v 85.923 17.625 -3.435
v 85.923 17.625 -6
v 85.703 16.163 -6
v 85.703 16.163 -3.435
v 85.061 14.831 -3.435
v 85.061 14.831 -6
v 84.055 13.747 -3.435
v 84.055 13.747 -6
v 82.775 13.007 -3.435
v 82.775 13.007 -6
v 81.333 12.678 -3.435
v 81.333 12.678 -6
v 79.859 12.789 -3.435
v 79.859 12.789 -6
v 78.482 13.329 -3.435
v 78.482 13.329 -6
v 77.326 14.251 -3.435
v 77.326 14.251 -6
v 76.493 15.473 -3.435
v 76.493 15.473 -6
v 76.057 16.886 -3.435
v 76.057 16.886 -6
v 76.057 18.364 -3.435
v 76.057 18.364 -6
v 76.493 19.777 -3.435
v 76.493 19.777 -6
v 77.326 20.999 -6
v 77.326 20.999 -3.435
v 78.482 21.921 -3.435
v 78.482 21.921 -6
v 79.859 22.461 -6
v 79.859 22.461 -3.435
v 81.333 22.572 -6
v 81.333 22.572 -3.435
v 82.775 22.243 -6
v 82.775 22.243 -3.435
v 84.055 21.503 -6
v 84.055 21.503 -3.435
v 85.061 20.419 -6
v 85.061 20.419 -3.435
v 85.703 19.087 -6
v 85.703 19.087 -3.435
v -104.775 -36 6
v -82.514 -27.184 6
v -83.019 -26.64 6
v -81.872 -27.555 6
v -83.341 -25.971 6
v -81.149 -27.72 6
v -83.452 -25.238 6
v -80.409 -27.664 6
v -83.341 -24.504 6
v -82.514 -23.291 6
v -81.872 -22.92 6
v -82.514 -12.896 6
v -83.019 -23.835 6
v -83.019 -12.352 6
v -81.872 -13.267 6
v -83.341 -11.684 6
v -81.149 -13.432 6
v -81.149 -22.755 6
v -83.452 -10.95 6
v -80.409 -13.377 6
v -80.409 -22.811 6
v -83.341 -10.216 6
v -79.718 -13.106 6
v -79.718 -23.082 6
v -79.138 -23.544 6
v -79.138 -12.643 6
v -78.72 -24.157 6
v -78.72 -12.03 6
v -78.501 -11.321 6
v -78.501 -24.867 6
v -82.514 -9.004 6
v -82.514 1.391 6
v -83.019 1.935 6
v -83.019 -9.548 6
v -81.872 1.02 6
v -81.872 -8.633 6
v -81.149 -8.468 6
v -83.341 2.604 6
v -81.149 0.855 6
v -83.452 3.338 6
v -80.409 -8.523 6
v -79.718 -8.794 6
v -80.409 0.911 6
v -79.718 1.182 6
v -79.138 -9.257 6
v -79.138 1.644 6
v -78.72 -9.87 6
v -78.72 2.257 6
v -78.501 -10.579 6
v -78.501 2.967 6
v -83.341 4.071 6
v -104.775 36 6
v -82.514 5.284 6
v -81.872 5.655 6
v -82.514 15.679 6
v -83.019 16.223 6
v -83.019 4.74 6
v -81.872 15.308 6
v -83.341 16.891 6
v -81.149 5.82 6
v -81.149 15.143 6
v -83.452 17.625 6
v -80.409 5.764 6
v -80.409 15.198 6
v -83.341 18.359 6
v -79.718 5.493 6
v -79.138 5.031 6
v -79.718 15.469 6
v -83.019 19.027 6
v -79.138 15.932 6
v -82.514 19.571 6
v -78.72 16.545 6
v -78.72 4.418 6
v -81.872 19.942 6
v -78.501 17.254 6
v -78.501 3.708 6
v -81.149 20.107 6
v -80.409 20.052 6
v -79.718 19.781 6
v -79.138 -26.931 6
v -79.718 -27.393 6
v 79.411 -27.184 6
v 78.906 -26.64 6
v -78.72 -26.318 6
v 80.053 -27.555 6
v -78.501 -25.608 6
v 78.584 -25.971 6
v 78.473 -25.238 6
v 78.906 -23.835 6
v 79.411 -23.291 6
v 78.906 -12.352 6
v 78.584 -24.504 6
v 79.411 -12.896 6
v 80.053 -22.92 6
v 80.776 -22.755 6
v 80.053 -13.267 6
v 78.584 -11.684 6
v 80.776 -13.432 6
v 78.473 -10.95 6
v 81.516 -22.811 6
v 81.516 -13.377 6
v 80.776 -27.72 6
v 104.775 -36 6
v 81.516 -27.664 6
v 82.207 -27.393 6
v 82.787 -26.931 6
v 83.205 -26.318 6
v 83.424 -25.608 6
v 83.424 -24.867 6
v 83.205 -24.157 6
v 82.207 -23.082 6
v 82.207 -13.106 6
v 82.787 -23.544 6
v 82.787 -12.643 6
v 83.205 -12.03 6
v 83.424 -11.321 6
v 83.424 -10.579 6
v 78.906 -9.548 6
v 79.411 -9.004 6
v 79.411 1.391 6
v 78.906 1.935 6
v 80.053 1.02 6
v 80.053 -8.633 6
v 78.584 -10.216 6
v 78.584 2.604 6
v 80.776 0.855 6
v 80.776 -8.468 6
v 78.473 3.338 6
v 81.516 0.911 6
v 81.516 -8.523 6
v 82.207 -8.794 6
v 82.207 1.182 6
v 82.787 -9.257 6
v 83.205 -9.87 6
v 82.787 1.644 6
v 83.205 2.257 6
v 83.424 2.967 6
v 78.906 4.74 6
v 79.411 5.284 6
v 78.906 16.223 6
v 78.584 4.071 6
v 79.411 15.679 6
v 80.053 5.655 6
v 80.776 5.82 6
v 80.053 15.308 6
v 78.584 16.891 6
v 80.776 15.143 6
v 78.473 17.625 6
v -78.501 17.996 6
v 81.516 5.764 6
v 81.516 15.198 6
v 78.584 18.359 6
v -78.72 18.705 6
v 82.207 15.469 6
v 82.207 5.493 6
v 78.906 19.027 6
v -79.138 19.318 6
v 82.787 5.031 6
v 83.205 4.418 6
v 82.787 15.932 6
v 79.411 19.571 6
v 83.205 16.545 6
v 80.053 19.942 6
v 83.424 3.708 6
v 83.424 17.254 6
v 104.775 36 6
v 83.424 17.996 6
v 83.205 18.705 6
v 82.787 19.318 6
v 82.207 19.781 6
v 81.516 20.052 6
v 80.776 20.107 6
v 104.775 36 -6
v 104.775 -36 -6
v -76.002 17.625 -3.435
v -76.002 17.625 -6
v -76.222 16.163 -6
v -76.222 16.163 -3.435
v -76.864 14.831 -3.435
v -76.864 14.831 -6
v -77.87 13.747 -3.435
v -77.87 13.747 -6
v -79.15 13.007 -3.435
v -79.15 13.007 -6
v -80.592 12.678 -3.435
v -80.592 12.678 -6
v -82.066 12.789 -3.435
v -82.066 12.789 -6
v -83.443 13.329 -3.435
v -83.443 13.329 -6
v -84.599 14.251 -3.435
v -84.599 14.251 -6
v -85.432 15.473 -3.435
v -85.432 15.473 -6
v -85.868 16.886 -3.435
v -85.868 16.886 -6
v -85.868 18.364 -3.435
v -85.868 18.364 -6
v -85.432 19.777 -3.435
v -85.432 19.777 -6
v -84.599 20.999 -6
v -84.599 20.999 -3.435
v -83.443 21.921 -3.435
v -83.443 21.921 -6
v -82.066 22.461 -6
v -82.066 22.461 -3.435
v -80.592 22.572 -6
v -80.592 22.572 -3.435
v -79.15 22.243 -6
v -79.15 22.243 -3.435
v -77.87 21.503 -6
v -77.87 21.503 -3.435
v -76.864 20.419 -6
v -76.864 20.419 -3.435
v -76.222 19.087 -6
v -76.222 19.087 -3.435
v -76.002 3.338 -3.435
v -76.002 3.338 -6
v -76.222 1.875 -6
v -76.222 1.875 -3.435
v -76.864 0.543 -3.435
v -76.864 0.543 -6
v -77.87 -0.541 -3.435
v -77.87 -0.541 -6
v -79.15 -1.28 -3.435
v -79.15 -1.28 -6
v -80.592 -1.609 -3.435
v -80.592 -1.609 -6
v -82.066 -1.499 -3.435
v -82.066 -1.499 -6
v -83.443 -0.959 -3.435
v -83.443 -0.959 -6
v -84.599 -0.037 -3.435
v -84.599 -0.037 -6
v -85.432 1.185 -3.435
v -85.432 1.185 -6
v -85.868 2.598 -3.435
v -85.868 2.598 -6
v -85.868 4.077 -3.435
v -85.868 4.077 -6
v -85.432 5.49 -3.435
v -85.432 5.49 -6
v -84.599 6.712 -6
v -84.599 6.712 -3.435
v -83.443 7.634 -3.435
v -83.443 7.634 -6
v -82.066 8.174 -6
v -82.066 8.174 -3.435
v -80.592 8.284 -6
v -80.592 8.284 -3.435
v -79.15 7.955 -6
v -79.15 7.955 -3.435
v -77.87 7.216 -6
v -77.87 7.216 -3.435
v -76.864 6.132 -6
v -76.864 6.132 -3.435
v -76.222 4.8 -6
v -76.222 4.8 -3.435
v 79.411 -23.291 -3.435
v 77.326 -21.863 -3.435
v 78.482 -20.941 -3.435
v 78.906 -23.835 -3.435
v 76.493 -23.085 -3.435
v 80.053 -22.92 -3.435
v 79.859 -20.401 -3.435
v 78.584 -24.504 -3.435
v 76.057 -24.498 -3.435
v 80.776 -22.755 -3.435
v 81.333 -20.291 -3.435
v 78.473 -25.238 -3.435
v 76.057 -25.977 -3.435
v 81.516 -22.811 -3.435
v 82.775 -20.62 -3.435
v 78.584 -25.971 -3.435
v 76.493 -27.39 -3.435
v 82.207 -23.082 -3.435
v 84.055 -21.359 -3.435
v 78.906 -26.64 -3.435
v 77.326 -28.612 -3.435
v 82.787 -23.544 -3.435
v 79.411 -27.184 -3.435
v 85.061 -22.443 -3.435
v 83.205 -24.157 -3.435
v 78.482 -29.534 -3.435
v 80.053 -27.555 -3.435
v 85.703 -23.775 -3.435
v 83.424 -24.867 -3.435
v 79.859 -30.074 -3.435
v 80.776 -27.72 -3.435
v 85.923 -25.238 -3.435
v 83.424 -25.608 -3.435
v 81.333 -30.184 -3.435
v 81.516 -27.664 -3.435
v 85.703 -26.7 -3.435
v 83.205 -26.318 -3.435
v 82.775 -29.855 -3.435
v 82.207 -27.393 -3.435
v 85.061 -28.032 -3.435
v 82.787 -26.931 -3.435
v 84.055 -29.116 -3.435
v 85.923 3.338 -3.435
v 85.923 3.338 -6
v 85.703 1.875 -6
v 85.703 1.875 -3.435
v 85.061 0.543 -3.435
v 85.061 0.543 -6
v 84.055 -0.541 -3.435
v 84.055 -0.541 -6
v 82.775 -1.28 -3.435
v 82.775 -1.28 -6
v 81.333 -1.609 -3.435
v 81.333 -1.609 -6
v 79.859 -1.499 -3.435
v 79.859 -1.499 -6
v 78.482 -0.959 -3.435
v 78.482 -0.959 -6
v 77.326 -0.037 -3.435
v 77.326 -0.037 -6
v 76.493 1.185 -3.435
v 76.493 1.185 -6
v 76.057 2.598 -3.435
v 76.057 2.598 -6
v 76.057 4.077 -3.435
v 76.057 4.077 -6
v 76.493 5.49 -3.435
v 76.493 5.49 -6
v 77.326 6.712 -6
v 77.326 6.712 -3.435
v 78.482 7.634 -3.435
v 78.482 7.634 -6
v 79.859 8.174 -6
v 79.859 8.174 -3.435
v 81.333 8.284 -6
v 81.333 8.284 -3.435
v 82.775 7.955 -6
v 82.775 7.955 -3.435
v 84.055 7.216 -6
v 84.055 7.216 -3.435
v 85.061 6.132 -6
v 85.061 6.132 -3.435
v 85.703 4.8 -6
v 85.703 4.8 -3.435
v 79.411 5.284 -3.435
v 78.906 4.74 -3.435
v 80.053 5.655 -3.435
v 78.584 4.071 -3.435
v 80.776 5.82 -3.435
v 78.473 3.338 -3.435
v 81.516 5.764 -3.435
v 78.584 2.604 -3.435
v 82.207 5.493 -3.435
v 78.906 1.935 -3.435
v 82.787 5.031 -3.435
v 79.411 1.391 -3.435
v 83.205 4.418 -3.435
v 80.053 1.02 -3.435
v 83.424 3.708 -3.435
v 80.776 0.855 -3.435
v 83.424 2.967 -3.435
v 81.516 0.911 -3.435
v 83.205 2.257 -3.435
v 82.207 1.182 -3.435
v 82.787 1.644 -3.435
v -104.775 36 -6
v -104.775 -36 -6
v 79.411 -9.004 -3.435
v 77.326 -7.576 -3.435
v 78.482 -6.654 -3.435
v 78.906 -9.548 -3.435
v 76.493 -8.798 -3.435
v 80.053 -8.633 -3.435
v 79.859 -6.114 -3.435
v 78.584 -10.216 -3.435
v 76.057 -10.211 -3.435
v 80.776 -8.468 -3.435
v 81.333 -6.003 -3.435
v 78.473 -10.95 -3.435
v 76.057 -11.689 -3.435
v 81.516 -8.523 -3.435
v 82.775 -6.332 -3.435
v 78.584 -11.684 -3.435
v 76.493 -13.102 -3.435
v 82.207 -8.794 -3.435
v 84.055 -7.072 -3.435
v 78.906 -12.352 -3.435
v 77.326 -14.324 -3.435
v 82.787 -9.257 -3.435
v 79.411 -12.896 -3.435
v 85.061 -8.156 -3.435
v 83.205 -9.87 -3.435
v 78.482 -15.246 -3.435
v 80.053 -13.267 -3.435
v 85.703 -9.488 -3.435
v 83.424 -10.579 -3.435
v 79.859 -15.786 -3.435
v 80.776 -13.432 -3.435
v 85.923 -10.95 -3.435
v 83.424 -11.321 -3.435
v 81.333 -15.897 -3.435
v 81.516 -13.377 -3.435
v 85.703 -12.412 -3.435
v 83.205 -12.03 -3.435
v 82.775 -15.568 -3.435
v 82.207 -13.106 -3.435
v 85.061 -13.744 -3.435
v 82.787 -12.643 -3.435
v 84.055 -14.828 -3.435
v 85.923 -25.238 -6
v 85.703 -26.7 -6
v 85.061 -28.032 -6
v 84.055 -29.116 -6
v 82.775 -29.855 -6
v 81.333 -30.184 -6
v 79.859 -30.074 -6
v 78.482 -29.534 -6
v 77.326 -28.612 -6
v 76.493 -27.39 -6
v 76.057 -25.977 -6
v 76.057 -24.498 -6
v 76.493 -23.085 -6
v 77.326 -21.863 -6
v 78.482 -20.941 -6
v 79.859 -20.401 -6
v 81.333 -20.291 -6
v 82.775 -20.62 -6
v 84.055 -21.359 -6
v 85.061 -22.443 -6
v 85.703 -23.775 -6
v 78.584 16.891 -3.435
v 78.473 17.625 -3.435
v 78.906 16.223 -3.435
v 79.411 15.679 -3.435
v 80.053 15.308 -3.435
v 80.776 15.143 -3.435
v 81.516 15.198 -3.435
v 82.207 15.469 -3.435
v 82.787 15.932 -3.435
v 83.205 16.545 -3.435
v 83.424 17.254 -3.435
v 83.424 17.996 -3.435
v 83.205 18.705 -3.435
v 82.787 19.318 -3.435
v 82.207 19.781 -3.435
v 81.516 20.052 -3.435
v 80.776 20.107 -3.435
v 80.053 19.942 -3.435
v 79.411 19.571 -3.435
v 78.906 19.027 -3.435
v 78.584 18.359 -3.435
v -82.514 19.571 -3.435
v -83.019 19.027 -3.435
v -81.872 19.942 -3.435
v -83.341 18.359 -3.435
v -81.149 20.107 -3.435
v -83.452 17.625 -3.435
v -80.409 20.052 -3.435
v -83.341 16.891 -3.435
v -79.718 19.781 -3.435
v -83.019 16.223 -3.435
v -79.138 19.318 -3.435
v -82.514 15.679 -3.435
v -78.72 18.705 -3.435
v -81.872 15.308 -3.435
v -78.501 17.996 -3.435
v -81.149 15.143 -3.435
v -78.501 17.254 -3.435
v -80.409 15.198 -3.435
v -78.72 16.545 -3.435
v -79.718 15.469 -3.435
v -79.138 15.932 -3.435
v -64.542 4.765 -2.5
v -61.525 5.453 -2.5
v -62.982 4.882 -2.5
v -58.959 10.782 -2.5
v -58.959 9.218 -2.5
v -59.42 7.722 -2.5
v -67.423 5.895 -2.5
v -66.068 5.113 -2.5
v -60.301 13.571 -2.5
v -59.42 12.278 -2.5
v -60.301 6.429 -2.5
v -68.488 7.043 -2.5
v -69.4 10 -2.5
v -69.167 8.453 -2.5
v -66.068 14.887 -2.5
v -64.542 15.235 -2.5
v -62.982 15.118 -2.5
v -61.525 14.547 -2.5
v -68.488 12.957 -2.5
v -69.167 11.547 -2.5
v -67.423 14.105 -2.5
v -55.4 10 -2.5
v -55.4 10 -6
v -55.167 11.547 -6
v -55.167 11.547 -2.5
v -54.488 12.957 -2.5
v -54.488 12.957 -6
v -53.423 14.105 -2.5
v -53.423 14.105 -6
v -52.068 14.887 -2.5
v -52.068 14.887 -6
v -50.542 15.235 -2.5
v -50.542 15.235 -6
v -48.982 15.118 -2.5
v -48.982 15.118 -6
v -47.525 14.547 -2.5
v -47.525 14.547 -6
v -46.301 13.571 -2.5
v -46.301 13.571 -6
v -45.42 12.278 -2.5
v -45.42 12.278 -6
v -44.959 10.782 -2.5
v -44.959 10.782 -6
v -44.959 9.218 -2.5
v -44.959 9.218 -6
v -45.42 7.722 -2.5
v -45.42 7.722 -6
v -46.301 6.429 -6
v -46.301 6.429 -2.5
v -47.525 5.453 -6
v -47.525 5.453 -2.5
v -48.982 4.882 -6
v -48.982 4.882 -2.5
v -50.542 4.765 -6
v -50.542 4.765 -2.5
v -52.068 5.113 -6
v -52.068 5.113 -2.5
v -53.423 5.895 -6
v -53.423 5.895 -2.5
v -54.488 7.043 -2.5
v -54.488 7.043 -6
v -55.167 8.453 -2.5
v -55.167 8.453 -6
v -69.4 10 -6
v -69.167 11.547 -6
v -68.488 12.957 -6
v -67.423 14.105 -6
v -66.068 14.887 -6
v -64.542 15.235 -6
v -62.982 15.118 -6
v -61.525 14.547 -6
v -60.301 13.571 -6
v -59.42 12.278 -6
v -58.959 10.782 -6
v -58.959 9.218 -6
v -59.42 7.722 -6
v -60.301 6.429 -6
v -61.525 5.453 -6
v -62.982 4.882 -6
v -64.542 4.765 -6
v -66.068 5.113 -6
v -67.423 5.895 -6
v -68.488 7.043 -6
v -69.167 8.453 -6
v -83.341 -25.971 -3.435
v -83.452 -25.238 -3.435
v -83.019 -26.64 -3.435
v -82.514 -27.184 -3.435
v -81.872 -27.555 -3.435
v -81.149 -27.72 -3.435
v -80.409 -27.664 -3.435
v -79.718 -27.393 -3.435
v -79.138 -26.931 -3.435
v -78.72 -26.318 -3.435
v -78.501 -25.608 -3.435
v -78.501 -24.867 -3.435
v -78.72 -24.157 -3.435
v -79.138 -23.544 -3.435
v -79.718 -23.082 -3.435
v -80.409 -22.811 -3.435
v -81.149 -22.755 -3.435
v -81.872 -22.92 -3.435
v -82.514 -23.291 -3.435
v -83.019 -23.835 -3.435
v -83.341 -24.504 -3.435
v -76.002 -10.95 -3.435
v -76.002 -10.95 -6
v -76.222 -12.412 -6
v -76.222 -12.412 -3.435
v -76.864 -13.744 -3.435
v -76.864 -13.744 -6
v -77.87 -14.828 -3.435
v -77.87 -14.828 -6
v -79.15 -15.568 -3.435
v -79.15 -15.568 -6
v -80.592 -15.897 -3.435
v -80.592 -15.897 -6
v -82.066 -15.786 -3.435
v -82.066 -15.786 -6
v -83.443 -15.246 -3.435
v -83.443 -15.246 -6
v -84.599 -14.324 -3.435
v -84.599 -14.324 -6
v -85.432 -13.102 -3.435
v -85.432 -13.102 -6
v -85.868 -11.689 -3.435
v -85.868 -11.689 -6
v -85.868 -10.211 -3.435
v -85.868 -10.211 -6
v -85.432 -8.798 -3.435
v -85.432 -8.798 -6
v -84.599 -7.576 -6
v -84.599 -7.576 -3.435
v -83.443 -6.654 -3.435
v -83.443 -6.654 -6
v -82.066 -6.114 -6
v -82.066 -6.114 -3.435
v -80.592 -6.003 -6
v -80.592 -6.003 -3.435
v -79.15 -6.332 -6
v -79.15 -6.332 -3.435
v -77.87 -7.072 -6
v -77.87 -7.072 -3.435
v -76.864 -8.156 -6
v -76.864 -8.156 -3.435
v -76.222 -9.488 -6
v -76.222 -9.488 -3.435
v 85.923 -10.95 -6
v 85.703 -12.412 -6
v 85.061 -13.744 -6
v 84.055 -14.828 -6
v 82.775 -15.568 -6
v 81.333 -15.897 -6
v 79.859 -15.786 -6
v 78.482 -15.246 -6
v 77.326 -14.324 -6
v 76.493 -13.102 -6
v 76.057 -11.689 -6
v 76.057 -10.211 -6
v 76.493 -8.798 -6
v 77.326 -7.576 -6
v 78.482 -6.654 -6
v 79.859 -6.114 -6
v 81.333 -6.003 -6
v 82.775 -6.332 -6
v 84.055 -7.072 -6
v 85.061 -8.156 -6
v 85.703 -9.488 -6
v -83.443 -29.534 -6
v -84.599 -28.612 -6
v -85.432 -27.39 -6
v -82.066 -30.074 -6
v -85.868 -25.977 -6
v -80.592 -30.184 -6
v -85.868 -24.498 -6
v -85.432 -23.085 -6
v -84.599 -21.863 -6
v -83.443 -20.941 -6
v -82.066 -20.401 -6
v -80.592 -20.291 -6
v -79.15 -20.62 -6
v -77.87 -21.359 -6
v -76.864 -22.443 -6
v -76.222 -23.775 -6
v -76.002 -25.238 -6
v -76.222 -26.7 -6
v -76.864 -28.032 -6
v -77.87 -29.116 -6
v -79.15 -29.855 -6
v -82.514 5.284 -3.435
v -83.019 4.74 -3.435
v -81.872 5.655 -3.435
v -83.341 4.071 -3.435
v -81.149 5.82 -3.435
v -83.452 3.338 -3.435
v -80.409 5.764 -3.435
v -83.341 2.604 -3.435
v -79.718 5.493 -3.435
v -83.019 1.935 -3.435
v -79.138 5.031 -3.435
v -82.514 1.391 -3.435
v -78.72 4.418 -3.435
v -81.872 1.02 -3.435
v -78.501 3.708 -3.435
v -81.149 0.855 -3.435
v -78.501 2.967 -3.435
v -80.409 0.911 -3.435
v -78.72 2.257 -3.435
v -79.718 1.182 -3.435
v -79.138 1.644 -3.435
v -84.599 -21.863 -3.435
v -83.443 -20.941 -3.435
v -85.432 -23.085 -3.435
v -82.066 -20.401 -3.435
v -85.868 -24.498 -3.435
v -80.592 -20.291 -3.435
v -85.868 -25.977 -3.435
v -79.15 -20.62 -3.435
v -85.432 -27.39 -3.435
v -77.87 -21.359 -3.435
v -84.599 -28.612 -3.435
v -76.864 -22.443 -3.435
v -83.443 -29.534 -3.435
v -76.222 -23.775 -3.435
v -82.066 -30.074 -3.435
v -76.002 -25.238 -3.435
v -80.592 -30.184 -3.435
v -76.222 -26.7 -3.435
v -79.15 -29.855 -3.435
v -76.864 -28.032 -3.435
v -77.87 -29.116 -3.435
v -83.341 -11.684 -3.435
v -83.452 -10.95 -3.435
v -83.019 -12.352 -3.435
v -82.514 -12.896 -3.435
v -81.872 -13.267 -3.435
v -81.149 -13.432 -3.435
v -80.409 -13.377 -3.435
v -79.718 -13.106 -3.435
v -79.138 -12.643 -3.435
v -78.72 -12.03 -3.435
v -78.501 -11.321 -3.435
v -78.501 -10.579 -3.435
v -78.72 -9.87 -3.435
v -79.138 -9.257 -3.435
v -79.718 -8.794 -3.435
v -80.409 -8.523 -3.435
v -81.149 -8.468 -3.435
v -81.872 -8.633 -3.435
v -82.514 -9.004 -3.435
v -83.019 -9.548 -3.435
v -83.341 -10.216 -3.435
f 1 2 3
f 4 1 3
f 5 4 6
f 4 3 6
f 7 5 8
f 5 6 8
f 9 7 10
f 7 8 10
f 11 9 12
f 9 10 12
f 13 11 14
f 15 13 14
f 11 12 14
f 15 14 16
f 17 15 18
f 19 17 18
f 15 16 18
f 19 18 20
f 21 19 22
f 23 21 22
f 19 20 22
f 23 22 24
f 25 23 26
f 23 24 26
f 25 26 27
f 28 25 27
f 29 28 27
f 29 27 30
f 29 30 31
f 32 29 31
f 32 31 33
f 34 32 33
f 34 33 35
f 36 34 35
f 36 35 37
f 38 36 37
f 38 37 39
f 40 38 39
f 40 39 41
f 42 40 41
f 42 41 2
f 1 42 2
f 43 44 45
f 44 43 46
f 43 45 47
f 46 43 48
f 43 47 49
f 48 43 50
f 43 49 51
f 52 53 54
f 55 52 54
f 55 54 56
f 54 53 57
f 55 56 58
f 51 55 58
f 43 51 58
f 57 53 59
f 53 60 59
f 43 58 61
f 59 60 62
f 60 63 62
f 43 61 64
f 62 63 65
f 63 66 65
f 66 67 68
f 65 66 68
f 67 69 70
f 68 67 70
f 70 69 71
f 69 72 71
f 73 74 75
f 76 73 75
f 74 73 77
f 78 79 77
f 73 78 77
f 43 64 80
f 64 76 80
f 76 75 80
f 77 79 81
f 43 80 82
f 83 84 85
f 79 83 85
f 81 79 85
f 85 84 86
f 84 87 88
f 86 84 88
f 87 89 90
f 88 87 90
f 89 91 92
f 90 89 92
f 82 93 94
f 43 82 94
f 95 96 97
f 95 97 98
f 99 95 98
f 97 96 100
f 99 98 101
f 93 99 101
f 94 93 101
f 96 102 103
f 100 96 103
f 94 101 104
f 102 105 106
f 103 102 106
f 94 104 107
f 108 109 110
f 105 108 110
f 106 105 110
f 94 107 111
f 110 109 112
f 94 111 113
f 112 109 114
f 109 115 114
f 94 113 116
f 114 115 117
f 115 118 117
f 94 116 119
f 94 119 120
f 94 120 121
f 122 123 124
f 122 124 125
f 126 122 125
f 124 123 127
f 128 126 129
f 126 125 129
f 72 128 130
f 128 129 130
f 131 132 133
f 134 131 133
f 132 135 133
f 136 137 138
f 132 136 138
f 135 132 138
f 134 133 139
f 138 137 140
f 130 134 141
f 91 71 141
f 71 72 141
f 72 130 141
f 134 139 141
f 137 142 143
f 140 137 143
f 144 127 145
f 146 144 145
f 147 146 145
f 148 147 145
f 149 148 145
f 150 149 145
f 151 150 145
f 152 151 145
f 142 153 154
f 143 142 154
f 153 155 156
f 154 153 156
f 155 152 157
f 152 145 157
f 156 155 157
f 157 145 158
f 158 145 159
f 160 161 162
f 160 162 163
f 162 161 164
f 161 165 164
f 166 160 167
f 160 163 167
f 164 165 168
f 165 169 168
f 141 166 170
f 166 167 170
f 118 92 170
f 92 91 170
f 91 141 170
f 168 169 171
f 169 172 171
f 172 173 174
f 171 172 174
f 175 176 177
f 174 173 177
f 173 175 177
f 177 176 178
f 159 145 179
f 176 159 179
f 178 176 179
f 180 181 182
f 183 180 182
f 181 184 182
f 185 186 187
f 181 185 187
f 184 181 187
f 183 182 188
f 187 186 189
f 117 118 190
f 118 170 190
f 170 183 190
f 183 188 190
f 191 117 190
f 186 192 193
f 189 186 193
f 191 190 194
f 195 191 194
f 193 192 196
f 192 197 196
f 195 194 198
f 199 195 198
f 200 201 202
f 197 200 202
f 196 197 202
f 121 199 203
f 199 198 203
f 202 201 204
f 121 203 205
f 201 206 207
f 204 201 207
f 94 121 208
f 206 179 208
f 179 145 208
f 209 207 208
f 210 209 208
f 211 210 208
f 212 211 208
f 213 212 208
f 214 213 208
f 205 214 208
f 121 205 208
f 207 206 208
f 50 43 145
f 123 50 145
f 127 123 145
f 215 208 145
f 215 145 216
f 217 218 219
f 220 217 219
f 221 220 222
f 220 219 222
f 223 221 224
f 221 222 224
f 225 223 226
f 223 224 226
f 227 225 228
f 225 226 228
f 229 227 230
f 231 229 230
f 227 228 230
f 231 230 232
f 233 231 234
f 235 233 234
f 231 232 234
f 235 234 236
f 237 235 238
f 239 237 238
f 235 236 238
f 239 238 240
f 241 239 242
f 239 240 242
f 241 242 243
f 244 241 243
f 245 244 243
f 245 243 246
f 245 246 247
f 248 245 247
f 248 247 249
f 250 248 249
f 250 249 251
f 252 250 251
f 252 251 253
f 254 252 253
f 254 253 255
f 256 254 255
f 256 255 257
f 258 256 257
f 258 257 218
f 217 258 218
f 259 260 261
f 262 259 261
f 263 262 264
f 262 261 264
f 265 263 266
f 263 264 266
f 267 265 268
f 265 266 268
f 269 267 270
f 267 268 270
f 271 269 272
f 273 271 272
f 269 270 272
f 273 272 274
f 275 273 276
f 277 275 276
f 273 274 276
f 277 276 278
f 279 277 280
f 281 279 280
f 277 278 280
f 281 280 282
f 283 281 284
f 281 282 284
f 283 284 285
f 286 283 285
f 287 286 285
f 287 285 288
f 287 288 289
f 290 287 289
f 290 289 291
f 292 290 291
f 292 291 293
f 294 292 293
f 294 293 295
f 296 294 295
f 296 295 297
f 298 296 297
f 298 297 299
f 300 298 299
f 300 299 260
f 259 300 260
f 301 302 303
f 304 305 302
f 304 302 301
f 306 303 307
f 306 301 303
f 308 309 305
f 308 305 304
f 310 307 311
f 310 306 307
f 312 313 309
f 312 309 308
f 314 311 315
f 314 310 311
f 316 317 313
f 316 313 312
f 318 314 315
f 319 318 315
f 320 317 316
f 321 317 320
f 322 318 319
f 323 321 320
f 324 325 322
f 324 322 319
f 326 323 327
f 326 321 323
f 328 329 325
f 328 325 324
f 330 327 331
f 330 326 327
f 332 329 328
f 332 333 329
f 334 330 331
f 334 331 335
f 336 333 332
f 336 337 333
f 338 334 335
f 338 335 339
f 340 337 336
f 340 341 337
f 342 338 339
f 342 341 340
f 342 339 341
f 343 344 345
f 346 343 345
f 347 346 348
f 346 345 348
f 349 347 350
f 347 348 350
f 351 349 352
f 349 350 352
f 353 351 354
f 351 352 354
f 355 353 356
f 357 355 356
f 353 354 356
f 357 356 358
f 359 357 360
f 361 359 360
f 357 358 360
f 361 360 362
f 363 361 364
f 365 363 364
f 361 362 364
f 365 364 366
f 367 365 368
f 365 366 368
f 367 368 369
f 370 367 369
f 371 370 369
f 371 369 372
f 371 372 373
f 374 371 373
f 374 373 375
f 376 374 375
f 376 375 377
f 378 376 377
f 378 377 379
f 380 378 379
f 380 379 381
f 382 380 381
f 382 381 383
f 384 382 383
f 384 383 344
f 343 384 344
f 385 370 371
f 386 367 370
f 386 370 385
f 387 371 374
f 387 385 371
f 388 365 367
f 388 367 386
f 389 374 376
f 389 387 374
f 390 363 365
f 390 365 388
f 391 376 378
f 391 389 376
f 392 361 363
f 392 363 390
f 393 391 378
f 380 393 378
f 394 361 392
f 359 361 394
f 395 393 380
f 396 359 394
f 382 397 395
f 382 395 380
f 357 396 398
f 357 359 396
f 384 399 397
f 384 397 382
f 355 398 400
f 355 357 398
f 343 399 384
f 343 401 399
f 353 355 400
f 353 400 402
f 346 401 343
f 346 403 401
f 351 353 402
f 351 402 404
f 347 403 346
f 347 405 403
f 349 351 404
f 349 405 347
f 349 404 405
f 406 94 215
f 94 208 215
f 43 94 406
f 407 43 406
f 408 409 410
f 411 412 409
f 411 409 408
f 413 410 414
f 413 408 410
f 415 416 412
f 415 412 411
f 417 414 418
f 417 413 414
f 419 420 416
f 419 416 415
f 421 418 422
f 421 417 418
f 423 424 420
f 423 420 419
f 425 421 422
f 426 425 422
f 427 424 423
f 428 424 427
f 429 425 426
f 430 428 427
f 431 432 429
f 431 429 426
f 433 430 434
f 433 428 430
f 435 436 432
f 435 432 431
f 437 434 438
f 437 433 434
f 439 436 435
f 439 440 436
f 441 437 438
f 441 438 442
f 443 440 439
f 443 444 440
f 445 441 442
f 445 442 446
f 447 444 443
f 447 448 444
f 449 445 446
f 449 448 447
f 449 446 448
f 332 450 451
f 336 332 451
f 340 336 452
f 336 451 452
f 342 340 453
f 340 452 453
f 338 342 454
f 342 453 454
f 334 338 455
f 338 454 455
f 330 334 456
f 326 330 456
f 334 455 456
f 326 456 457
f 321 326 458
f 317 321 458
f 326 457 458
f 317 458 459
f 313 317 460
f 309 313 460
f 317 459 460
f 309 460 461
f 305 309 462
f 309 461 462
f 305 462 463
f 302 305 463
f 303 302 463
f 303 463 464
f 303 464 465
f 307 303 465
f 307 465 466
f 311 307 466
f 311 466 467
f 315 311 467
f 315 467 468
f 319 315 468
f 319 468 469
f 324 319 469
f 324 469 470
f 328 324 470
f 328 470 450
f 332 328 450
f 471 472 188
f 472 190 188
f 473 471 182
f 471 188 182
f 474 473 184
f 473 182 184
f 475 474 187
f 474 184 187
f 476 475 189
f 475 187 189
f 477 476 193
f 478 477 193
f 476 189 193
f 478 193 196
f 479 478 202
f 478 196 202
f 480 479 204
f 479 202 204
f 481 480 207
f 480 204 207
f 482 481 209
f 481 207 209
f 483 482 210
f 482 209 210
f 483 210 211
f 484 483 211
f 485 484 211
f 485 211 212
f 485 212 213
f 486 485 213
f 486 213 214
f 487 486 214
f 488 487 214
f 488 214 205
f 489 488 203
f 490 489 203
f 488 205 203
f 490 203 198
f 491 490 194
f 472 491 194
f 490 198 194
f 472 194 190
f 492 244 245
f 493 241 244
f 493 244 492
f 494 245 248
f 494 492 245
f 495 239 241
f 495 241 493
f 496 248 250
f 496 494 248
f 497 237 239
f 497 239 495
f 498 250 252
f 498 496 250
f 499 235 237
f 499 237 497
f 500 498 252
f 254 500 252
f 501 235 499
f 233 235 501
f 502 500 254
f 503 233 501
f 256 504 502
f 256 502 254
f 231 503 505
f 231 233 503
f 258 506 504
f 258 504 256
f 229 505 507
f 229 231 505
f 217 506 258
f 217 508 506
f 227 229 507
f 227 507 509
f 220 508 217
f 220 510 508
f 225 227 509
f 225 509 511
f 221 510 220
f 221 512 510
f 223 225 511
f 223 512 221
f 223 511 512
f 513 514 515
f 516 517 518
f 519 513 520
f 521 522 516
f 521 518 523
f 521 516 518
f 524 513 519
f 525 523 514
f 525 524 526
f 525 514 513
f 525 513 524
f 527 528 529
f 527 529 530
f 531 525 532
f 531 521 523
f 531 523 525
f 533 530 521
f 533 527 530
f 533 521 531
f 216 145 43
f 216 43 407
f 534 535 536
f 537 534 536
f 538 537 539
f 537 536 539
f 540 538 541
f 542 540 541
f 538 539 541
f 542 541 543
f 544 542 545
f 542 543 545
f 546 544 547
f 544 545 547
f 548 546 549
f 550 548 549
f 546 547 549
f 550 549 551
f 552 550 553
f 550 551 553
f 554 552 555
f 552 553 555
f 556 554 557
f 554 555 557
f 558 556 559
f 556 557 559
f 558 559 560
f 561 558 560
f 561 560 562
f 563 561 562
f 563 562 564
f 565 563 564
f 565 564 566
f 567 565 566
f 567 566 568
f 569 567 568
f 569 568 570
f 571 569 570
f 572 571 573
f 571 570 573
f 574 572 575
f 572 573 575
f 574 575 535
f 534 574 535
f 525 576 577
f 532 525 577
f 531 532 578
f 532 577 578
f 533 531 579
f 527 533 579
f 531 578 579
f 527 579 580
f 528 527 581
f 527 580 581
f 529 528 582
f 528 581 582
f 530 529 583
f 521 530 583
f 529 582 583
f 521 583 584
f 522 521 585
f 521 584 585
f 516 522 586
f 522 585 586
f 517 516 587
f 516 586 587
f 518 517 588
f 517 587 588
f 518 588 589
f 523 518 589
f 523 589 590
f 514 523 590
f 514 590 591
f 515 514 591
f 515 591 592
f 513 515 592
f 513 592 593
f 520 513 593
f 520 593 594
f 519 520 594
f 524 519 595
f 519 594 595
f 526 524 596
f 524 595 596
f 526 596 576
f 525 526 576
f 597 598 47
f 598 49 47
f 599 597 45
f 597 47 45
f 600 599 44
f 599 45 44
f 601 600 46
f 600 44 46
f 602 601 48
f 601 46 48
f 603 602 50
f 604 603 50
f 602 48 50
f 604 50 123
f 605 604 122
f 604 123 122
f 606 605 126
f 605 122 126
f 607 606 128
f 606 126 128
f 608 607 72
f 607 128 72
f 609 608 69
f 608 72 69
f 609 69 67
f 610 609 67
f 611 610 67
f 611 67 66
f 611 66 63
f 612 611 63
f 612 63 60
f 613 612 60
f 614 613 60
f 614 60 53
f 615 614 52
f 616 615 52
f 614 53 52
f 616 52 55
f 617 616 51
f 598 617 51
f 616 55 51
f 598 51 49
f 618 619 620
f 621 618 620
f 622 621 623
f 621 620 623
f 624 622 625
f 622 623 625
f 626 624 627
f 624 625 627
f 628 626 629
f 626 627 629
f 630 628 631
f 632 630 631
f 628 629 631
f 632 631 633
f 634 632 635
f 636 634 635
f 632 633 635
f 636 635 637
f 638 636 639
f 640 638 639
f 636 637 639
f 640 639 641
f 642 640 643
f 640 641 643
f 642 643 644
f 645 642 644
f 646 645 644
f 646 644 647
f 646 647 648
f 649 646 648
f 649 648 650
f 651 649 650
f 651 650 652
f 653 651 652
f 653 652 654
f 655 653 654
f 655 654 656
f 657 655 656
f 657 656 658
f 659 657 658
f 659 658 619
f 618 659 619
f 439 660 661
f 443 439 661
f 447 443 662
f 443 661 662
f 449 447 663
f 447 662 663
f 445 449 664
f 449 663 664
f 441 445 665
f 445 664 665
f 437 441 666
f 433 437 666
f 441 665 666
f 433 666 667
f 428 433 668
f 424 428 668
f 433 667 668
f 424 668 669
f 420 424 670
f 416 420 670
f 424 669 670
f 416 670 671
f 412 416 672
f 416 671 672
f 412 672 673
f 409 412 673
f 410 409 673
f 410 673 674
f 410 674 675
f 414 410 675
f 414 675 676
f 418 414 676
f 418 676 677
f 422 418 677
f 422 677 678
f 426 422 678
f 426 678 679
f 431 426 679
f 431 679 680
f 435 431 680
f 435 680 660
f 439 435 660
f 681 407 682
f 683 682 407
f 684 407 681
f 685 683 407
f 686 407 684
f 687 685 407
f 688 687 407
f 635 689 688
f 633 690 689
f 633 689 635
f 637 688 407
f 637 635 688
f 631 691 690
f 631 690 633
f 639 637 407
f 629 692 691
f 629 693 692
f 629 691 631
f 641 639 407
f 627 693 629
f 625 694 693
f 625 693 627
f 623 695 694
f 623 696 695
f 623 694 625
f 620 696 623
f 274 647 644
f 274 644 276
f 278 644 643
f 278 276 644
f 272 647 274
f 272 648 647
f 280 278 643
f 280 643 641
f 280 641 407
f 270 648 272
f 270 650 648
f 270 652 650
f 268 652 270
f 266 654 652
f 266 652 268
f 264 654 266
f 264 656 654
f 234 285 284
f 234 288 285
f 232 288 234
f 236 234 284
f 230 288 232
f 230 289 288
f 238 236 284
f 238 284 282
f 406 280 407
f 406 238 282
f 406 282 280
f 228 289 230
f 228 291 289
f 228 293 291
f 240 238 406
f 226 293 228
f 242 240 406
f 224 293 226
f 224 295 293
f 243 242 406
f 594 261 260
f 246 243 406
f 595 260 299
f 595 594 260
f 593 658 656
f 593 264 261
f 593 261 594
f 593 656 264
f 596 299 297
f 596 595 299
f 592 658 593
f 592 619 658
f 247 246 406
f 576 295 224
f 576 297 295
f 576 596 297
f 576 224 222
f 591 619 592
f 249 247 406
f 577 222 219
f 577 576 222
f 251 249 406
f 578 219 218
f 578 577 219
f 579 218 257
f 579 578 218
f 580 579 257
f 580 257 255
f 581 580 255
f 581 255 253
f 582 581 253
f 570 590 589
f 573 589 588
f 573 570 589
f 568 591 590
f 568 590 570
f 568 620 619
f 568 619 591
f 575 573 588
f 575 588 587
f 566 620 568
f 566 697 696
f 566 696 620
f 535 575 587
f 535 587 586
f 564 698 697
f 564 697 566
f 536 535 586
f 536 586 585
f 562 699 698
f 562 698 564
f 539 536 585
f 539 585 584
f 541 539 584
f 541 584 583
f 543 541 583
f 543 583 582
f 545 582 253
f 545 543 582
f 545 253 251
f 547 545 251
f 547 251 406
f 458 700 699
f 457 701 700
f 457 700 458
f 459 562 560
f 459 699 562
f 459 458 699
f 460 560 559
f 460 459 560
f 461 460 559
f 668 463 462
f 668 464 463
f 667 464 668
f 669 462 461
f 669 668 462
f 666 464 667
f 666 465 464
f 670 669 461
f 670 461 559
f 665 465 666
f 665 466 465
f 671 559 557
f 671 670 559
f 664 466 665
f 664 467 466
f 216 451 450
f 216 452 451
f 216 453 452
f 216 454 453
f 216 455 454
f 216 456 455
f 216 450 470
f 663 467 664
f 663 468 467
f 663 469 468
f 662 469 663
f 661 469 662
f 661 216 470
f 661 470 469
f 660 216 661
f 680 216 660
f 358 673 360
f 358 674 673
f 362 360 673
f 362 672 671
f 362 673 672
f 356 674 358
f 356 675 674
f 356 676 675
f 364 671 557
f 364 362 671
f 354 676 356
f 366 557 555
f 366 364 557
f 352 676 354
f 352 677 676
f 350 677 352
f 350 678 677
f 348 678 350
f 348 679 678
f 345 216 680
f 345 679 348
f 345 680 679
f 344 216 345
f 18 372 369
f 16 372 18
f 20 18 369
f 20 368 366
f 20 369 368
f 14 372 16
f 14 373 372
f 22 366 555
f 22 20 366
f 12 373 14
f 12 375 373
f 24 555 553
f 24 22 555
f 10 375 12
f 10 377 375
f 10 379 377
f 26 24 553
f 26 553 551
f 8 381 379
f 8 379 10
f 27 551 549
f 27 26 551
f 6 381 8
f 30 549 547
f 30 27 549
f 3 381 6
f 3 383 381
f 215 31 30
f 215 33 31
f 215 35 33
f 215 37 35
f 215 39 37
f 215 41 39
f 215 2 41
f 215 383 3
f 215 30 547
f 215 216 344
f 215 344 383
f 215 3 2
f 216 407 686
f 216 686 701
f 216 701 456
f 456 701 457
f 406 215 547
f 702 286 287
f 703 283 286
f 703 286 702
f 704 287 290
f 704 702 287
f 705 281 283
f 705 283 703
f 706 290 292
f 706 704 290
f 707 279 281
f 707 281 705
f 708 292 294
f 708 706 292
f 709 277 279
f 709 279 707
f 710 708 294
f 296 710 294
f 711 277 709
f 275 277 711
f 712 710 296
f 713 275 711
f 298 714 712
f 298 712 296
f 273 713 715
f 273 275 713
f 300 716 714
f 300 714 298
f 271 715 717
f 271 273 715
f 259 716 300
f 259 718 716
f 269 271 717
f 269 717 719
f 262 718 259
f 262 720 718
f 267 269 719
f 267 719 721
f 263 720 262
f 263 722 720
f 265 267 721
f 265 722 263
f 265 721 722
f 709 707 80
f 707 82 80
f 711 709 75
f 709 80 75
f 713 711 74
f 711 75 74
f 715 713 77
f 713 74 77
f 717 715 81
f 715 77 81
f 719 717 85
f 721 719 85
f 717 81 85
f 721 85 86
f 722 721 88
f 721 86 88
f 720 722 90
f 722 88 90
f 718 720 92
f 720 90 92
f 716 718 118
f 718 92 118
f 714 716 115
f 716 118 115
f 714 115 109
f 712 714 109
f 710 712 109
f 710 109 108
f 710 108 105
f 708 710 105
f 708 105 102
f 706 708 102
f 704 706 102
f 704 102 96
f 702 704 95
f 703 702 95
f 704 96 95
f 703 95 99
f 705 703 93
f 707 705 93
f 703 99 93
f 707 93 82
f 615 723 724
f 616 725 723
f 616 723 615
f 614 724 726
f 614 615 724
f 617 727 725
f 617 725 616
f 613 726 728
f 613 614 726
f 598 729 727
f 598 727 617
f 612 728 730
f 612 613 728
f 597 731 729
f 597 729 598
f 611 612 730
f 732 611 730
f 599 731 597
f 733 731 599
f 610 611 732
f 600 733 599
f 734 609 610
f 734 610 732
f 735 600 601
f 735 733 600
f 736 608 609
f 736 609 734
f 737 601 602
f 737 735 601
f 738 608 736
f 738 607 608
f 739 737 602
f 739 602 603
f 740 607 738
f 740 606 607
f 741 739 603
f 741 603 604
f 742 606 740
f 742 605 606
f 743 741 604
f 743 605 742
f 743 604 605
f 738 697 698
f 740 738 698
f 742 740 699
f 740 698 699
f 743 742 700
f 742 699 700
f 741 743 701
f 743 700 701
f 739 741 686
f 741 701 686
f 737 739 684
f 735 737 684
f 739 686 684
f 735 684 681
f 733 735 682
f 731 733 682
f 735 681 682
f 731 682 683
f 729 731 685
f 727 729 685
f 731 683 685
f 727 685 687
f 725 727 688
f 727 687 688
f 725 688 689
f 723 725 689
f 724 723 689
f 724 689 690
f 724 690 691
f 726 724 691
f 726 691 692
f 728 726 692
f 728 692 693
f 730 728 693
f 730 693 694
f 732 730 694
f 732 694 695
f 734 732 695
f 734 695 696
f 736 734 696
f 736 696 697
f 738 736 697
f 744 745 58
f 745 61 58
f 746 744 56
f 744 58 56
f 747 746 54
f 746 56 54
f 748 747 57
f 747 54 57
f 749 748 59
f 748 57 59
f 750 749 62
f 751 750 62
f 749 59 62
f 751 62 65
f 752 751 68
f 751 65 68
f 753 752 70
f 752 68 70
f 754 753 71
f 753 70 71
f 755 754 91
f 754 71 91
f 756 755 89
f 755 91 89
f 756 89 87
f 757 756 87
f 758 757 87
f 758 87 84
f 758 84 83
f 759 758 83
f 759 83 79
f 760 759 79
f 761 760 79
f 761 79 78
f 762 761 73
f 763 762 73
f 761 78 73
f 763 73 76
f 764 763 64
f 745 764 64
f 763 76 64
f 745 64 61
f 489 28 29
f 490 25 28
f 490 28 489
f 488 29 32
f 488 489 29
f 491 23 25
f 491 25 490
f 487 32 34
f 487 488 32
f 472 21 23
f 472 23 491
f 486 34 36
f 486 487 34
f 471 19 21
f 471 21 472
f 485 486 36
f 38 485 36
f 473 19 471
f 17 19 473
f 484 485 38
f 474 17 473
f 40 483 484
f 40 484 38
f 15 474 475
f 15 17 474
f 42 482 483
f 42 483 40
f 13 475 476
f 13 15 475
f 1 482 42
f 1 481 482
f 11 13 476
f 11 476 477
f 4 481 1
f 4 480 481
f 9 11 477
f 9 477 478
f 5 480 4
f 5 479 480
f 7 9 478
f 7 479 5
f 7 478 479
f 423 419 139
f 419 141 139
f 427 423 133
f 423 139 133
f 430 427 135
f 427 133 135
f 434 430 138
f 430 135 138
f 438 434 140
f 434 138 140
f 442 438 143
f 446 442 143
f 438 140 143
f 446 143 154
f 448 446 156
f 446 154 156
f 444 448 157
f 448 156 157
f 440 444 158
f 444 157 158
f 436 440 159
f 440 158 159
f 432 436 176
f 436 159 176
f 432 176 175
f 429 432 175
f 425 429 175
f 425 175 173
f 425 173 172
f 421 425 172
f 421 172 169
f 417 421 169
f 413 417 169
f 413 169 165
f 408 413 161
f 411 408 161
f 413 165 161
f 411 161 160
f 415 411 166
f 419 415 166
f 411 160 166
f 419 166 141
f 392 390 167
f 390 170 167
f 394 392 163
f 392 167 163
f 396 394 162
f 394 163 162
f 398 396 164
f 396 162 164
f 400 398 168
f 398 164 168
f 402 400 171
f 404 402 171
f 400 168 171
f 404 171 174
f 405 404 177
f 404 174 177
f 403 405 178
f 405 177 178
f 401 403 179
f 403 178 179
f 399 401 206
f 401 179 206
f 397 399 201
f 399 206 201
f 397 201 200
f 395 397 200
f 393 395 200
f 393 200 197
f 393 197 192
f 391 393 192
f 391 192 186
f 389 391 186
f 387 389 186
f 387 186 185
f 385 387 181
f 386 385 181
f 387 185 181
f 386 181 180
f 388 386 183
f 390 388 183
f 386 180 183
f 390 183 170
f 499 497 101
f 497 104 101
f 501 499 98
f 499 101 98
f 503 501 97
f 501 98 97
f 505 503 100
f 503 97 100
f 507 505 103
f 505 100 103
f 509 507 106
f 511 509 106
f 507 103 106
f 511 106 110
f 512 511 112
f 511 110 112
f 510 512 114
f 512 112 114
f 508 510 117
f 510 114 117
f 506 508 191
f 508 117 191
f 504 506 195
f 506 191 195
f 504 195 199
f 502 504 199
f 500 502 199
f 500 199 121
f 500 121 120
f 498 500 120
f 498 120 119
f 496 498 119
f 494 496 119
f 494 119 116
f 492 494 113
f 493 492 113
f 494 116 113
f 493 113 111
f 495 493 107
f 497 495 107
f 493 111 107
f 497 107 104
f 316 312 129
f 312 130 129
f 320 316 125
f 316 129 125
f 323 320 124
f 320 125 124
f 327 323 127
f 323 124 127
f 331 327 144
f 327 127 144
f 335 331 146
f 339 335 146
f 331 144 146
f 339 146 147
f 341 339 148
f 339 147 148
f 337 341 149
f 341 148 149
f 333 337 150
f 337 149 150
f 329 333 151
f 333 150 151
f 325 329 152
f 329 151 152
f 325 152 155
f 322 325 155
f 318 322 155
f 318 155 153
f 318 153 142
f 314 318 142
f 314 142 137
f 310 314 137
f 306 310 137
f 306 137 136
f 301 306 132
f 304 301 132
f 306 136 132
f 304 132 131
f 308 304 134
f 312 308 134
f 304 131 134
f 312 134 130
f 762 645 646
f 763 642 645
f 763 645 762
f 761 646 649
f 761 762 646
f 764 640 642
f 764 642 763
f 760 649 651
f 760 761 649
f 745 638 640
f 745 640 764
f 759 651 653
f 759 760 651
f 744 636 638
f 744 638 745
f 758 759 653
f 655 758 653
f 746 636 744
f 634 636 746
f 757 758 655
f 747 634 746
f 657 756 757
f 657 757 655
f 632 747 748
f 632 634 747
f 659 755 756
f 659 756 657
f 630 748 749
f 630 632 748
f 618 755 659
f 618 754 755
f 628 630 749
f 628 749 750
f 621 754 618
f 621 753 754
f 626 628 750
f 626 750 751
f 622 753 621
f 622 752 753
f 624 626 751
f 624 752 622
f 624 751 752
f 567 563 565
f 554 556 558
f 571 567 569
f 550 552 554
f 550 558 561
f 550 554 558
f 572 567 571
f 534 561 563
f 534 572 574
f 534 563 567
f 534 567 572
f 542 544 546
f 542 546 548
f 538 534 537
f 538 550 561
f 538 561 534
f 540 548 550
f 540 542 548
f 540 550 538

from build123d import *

# Parameters (mm, degrees)
SKETCH1_W                                       = 12
SKETCH1_H                                       = 72
BOSS_EXTRUDE1_DEPTH                             = 104.775
CBORE_FOR_10_BUTTON_HEAD_CAP_SCREW1_D           = 4.9784
CBORE_FOR_10_BUTTON_HEAD_CAP_SCREW1_CBORE_D     = 9.92124
CBORE_FOR_10_BUTTON_HEAD_CAP_SCREW1_CBORE_DEPTH = 2.5654
SKETCH5_R                                       = 5.25
CUT_EXTRUDE1_DEPTH                              = 3.5


with BuildPart() as part:
    # Sketch1 → Boss-Extrude1 (new, symmetric)
    with BuildSketch(Plane(origin=(0, 0, 0), x_dir=(0, 0, -1), z_dir=(1, 0, 0))):
        Rectangle(SKETCH1_W, SKETCH1_H)
    extrude(amount=BOSS_EXTRUDE1_DEPTH, both=True)

    # CBORE for #10 Button Head Cap Screw1 (through all)
    with Locations(Plane(origin=(0, 0, -6), x_dir=(1, 0, 0), z_dir=(0, 0, -1))):
        with Locations((-80.9625, 25.2375), (-80.9625, 10.95), (-80.9625, -3.3375), (-80.9625, -17.625), (80.9625, 25.2375), (80.9625, 10.95), (80.9625, -3.3375), (80.9625, -17.625)):
            CounterBoreHole(CBORE_FOR_10_BUTTON_HEAD_CAP_SCREW1_D / 2, CBORE_FOR_10_BUTTON_HEAD_CAP_SCREW1_CBORE_D / 2, CBORE_FOR_10_BUTTON_HEAD_CAP_SCREW1_CBORE_DEPTH)

    # Sketch5 → Cut-Extrude1 (cut)
    with BuildSketch(Plane(origin=(0, 0, -6), x_dir=(-1, 0, 0), z_dir=(0, 0, -1))):
        with Locations((64.15, 10)):
            Circle(SKETCH5_R)
        with Locations((50.15, 10)):
            Circle(SKETCH5_R)
    extrude(amount=-CUT_EXTRUDE1_DEPTH, mode=Mode.SUBTRACT)


solid = part.part
